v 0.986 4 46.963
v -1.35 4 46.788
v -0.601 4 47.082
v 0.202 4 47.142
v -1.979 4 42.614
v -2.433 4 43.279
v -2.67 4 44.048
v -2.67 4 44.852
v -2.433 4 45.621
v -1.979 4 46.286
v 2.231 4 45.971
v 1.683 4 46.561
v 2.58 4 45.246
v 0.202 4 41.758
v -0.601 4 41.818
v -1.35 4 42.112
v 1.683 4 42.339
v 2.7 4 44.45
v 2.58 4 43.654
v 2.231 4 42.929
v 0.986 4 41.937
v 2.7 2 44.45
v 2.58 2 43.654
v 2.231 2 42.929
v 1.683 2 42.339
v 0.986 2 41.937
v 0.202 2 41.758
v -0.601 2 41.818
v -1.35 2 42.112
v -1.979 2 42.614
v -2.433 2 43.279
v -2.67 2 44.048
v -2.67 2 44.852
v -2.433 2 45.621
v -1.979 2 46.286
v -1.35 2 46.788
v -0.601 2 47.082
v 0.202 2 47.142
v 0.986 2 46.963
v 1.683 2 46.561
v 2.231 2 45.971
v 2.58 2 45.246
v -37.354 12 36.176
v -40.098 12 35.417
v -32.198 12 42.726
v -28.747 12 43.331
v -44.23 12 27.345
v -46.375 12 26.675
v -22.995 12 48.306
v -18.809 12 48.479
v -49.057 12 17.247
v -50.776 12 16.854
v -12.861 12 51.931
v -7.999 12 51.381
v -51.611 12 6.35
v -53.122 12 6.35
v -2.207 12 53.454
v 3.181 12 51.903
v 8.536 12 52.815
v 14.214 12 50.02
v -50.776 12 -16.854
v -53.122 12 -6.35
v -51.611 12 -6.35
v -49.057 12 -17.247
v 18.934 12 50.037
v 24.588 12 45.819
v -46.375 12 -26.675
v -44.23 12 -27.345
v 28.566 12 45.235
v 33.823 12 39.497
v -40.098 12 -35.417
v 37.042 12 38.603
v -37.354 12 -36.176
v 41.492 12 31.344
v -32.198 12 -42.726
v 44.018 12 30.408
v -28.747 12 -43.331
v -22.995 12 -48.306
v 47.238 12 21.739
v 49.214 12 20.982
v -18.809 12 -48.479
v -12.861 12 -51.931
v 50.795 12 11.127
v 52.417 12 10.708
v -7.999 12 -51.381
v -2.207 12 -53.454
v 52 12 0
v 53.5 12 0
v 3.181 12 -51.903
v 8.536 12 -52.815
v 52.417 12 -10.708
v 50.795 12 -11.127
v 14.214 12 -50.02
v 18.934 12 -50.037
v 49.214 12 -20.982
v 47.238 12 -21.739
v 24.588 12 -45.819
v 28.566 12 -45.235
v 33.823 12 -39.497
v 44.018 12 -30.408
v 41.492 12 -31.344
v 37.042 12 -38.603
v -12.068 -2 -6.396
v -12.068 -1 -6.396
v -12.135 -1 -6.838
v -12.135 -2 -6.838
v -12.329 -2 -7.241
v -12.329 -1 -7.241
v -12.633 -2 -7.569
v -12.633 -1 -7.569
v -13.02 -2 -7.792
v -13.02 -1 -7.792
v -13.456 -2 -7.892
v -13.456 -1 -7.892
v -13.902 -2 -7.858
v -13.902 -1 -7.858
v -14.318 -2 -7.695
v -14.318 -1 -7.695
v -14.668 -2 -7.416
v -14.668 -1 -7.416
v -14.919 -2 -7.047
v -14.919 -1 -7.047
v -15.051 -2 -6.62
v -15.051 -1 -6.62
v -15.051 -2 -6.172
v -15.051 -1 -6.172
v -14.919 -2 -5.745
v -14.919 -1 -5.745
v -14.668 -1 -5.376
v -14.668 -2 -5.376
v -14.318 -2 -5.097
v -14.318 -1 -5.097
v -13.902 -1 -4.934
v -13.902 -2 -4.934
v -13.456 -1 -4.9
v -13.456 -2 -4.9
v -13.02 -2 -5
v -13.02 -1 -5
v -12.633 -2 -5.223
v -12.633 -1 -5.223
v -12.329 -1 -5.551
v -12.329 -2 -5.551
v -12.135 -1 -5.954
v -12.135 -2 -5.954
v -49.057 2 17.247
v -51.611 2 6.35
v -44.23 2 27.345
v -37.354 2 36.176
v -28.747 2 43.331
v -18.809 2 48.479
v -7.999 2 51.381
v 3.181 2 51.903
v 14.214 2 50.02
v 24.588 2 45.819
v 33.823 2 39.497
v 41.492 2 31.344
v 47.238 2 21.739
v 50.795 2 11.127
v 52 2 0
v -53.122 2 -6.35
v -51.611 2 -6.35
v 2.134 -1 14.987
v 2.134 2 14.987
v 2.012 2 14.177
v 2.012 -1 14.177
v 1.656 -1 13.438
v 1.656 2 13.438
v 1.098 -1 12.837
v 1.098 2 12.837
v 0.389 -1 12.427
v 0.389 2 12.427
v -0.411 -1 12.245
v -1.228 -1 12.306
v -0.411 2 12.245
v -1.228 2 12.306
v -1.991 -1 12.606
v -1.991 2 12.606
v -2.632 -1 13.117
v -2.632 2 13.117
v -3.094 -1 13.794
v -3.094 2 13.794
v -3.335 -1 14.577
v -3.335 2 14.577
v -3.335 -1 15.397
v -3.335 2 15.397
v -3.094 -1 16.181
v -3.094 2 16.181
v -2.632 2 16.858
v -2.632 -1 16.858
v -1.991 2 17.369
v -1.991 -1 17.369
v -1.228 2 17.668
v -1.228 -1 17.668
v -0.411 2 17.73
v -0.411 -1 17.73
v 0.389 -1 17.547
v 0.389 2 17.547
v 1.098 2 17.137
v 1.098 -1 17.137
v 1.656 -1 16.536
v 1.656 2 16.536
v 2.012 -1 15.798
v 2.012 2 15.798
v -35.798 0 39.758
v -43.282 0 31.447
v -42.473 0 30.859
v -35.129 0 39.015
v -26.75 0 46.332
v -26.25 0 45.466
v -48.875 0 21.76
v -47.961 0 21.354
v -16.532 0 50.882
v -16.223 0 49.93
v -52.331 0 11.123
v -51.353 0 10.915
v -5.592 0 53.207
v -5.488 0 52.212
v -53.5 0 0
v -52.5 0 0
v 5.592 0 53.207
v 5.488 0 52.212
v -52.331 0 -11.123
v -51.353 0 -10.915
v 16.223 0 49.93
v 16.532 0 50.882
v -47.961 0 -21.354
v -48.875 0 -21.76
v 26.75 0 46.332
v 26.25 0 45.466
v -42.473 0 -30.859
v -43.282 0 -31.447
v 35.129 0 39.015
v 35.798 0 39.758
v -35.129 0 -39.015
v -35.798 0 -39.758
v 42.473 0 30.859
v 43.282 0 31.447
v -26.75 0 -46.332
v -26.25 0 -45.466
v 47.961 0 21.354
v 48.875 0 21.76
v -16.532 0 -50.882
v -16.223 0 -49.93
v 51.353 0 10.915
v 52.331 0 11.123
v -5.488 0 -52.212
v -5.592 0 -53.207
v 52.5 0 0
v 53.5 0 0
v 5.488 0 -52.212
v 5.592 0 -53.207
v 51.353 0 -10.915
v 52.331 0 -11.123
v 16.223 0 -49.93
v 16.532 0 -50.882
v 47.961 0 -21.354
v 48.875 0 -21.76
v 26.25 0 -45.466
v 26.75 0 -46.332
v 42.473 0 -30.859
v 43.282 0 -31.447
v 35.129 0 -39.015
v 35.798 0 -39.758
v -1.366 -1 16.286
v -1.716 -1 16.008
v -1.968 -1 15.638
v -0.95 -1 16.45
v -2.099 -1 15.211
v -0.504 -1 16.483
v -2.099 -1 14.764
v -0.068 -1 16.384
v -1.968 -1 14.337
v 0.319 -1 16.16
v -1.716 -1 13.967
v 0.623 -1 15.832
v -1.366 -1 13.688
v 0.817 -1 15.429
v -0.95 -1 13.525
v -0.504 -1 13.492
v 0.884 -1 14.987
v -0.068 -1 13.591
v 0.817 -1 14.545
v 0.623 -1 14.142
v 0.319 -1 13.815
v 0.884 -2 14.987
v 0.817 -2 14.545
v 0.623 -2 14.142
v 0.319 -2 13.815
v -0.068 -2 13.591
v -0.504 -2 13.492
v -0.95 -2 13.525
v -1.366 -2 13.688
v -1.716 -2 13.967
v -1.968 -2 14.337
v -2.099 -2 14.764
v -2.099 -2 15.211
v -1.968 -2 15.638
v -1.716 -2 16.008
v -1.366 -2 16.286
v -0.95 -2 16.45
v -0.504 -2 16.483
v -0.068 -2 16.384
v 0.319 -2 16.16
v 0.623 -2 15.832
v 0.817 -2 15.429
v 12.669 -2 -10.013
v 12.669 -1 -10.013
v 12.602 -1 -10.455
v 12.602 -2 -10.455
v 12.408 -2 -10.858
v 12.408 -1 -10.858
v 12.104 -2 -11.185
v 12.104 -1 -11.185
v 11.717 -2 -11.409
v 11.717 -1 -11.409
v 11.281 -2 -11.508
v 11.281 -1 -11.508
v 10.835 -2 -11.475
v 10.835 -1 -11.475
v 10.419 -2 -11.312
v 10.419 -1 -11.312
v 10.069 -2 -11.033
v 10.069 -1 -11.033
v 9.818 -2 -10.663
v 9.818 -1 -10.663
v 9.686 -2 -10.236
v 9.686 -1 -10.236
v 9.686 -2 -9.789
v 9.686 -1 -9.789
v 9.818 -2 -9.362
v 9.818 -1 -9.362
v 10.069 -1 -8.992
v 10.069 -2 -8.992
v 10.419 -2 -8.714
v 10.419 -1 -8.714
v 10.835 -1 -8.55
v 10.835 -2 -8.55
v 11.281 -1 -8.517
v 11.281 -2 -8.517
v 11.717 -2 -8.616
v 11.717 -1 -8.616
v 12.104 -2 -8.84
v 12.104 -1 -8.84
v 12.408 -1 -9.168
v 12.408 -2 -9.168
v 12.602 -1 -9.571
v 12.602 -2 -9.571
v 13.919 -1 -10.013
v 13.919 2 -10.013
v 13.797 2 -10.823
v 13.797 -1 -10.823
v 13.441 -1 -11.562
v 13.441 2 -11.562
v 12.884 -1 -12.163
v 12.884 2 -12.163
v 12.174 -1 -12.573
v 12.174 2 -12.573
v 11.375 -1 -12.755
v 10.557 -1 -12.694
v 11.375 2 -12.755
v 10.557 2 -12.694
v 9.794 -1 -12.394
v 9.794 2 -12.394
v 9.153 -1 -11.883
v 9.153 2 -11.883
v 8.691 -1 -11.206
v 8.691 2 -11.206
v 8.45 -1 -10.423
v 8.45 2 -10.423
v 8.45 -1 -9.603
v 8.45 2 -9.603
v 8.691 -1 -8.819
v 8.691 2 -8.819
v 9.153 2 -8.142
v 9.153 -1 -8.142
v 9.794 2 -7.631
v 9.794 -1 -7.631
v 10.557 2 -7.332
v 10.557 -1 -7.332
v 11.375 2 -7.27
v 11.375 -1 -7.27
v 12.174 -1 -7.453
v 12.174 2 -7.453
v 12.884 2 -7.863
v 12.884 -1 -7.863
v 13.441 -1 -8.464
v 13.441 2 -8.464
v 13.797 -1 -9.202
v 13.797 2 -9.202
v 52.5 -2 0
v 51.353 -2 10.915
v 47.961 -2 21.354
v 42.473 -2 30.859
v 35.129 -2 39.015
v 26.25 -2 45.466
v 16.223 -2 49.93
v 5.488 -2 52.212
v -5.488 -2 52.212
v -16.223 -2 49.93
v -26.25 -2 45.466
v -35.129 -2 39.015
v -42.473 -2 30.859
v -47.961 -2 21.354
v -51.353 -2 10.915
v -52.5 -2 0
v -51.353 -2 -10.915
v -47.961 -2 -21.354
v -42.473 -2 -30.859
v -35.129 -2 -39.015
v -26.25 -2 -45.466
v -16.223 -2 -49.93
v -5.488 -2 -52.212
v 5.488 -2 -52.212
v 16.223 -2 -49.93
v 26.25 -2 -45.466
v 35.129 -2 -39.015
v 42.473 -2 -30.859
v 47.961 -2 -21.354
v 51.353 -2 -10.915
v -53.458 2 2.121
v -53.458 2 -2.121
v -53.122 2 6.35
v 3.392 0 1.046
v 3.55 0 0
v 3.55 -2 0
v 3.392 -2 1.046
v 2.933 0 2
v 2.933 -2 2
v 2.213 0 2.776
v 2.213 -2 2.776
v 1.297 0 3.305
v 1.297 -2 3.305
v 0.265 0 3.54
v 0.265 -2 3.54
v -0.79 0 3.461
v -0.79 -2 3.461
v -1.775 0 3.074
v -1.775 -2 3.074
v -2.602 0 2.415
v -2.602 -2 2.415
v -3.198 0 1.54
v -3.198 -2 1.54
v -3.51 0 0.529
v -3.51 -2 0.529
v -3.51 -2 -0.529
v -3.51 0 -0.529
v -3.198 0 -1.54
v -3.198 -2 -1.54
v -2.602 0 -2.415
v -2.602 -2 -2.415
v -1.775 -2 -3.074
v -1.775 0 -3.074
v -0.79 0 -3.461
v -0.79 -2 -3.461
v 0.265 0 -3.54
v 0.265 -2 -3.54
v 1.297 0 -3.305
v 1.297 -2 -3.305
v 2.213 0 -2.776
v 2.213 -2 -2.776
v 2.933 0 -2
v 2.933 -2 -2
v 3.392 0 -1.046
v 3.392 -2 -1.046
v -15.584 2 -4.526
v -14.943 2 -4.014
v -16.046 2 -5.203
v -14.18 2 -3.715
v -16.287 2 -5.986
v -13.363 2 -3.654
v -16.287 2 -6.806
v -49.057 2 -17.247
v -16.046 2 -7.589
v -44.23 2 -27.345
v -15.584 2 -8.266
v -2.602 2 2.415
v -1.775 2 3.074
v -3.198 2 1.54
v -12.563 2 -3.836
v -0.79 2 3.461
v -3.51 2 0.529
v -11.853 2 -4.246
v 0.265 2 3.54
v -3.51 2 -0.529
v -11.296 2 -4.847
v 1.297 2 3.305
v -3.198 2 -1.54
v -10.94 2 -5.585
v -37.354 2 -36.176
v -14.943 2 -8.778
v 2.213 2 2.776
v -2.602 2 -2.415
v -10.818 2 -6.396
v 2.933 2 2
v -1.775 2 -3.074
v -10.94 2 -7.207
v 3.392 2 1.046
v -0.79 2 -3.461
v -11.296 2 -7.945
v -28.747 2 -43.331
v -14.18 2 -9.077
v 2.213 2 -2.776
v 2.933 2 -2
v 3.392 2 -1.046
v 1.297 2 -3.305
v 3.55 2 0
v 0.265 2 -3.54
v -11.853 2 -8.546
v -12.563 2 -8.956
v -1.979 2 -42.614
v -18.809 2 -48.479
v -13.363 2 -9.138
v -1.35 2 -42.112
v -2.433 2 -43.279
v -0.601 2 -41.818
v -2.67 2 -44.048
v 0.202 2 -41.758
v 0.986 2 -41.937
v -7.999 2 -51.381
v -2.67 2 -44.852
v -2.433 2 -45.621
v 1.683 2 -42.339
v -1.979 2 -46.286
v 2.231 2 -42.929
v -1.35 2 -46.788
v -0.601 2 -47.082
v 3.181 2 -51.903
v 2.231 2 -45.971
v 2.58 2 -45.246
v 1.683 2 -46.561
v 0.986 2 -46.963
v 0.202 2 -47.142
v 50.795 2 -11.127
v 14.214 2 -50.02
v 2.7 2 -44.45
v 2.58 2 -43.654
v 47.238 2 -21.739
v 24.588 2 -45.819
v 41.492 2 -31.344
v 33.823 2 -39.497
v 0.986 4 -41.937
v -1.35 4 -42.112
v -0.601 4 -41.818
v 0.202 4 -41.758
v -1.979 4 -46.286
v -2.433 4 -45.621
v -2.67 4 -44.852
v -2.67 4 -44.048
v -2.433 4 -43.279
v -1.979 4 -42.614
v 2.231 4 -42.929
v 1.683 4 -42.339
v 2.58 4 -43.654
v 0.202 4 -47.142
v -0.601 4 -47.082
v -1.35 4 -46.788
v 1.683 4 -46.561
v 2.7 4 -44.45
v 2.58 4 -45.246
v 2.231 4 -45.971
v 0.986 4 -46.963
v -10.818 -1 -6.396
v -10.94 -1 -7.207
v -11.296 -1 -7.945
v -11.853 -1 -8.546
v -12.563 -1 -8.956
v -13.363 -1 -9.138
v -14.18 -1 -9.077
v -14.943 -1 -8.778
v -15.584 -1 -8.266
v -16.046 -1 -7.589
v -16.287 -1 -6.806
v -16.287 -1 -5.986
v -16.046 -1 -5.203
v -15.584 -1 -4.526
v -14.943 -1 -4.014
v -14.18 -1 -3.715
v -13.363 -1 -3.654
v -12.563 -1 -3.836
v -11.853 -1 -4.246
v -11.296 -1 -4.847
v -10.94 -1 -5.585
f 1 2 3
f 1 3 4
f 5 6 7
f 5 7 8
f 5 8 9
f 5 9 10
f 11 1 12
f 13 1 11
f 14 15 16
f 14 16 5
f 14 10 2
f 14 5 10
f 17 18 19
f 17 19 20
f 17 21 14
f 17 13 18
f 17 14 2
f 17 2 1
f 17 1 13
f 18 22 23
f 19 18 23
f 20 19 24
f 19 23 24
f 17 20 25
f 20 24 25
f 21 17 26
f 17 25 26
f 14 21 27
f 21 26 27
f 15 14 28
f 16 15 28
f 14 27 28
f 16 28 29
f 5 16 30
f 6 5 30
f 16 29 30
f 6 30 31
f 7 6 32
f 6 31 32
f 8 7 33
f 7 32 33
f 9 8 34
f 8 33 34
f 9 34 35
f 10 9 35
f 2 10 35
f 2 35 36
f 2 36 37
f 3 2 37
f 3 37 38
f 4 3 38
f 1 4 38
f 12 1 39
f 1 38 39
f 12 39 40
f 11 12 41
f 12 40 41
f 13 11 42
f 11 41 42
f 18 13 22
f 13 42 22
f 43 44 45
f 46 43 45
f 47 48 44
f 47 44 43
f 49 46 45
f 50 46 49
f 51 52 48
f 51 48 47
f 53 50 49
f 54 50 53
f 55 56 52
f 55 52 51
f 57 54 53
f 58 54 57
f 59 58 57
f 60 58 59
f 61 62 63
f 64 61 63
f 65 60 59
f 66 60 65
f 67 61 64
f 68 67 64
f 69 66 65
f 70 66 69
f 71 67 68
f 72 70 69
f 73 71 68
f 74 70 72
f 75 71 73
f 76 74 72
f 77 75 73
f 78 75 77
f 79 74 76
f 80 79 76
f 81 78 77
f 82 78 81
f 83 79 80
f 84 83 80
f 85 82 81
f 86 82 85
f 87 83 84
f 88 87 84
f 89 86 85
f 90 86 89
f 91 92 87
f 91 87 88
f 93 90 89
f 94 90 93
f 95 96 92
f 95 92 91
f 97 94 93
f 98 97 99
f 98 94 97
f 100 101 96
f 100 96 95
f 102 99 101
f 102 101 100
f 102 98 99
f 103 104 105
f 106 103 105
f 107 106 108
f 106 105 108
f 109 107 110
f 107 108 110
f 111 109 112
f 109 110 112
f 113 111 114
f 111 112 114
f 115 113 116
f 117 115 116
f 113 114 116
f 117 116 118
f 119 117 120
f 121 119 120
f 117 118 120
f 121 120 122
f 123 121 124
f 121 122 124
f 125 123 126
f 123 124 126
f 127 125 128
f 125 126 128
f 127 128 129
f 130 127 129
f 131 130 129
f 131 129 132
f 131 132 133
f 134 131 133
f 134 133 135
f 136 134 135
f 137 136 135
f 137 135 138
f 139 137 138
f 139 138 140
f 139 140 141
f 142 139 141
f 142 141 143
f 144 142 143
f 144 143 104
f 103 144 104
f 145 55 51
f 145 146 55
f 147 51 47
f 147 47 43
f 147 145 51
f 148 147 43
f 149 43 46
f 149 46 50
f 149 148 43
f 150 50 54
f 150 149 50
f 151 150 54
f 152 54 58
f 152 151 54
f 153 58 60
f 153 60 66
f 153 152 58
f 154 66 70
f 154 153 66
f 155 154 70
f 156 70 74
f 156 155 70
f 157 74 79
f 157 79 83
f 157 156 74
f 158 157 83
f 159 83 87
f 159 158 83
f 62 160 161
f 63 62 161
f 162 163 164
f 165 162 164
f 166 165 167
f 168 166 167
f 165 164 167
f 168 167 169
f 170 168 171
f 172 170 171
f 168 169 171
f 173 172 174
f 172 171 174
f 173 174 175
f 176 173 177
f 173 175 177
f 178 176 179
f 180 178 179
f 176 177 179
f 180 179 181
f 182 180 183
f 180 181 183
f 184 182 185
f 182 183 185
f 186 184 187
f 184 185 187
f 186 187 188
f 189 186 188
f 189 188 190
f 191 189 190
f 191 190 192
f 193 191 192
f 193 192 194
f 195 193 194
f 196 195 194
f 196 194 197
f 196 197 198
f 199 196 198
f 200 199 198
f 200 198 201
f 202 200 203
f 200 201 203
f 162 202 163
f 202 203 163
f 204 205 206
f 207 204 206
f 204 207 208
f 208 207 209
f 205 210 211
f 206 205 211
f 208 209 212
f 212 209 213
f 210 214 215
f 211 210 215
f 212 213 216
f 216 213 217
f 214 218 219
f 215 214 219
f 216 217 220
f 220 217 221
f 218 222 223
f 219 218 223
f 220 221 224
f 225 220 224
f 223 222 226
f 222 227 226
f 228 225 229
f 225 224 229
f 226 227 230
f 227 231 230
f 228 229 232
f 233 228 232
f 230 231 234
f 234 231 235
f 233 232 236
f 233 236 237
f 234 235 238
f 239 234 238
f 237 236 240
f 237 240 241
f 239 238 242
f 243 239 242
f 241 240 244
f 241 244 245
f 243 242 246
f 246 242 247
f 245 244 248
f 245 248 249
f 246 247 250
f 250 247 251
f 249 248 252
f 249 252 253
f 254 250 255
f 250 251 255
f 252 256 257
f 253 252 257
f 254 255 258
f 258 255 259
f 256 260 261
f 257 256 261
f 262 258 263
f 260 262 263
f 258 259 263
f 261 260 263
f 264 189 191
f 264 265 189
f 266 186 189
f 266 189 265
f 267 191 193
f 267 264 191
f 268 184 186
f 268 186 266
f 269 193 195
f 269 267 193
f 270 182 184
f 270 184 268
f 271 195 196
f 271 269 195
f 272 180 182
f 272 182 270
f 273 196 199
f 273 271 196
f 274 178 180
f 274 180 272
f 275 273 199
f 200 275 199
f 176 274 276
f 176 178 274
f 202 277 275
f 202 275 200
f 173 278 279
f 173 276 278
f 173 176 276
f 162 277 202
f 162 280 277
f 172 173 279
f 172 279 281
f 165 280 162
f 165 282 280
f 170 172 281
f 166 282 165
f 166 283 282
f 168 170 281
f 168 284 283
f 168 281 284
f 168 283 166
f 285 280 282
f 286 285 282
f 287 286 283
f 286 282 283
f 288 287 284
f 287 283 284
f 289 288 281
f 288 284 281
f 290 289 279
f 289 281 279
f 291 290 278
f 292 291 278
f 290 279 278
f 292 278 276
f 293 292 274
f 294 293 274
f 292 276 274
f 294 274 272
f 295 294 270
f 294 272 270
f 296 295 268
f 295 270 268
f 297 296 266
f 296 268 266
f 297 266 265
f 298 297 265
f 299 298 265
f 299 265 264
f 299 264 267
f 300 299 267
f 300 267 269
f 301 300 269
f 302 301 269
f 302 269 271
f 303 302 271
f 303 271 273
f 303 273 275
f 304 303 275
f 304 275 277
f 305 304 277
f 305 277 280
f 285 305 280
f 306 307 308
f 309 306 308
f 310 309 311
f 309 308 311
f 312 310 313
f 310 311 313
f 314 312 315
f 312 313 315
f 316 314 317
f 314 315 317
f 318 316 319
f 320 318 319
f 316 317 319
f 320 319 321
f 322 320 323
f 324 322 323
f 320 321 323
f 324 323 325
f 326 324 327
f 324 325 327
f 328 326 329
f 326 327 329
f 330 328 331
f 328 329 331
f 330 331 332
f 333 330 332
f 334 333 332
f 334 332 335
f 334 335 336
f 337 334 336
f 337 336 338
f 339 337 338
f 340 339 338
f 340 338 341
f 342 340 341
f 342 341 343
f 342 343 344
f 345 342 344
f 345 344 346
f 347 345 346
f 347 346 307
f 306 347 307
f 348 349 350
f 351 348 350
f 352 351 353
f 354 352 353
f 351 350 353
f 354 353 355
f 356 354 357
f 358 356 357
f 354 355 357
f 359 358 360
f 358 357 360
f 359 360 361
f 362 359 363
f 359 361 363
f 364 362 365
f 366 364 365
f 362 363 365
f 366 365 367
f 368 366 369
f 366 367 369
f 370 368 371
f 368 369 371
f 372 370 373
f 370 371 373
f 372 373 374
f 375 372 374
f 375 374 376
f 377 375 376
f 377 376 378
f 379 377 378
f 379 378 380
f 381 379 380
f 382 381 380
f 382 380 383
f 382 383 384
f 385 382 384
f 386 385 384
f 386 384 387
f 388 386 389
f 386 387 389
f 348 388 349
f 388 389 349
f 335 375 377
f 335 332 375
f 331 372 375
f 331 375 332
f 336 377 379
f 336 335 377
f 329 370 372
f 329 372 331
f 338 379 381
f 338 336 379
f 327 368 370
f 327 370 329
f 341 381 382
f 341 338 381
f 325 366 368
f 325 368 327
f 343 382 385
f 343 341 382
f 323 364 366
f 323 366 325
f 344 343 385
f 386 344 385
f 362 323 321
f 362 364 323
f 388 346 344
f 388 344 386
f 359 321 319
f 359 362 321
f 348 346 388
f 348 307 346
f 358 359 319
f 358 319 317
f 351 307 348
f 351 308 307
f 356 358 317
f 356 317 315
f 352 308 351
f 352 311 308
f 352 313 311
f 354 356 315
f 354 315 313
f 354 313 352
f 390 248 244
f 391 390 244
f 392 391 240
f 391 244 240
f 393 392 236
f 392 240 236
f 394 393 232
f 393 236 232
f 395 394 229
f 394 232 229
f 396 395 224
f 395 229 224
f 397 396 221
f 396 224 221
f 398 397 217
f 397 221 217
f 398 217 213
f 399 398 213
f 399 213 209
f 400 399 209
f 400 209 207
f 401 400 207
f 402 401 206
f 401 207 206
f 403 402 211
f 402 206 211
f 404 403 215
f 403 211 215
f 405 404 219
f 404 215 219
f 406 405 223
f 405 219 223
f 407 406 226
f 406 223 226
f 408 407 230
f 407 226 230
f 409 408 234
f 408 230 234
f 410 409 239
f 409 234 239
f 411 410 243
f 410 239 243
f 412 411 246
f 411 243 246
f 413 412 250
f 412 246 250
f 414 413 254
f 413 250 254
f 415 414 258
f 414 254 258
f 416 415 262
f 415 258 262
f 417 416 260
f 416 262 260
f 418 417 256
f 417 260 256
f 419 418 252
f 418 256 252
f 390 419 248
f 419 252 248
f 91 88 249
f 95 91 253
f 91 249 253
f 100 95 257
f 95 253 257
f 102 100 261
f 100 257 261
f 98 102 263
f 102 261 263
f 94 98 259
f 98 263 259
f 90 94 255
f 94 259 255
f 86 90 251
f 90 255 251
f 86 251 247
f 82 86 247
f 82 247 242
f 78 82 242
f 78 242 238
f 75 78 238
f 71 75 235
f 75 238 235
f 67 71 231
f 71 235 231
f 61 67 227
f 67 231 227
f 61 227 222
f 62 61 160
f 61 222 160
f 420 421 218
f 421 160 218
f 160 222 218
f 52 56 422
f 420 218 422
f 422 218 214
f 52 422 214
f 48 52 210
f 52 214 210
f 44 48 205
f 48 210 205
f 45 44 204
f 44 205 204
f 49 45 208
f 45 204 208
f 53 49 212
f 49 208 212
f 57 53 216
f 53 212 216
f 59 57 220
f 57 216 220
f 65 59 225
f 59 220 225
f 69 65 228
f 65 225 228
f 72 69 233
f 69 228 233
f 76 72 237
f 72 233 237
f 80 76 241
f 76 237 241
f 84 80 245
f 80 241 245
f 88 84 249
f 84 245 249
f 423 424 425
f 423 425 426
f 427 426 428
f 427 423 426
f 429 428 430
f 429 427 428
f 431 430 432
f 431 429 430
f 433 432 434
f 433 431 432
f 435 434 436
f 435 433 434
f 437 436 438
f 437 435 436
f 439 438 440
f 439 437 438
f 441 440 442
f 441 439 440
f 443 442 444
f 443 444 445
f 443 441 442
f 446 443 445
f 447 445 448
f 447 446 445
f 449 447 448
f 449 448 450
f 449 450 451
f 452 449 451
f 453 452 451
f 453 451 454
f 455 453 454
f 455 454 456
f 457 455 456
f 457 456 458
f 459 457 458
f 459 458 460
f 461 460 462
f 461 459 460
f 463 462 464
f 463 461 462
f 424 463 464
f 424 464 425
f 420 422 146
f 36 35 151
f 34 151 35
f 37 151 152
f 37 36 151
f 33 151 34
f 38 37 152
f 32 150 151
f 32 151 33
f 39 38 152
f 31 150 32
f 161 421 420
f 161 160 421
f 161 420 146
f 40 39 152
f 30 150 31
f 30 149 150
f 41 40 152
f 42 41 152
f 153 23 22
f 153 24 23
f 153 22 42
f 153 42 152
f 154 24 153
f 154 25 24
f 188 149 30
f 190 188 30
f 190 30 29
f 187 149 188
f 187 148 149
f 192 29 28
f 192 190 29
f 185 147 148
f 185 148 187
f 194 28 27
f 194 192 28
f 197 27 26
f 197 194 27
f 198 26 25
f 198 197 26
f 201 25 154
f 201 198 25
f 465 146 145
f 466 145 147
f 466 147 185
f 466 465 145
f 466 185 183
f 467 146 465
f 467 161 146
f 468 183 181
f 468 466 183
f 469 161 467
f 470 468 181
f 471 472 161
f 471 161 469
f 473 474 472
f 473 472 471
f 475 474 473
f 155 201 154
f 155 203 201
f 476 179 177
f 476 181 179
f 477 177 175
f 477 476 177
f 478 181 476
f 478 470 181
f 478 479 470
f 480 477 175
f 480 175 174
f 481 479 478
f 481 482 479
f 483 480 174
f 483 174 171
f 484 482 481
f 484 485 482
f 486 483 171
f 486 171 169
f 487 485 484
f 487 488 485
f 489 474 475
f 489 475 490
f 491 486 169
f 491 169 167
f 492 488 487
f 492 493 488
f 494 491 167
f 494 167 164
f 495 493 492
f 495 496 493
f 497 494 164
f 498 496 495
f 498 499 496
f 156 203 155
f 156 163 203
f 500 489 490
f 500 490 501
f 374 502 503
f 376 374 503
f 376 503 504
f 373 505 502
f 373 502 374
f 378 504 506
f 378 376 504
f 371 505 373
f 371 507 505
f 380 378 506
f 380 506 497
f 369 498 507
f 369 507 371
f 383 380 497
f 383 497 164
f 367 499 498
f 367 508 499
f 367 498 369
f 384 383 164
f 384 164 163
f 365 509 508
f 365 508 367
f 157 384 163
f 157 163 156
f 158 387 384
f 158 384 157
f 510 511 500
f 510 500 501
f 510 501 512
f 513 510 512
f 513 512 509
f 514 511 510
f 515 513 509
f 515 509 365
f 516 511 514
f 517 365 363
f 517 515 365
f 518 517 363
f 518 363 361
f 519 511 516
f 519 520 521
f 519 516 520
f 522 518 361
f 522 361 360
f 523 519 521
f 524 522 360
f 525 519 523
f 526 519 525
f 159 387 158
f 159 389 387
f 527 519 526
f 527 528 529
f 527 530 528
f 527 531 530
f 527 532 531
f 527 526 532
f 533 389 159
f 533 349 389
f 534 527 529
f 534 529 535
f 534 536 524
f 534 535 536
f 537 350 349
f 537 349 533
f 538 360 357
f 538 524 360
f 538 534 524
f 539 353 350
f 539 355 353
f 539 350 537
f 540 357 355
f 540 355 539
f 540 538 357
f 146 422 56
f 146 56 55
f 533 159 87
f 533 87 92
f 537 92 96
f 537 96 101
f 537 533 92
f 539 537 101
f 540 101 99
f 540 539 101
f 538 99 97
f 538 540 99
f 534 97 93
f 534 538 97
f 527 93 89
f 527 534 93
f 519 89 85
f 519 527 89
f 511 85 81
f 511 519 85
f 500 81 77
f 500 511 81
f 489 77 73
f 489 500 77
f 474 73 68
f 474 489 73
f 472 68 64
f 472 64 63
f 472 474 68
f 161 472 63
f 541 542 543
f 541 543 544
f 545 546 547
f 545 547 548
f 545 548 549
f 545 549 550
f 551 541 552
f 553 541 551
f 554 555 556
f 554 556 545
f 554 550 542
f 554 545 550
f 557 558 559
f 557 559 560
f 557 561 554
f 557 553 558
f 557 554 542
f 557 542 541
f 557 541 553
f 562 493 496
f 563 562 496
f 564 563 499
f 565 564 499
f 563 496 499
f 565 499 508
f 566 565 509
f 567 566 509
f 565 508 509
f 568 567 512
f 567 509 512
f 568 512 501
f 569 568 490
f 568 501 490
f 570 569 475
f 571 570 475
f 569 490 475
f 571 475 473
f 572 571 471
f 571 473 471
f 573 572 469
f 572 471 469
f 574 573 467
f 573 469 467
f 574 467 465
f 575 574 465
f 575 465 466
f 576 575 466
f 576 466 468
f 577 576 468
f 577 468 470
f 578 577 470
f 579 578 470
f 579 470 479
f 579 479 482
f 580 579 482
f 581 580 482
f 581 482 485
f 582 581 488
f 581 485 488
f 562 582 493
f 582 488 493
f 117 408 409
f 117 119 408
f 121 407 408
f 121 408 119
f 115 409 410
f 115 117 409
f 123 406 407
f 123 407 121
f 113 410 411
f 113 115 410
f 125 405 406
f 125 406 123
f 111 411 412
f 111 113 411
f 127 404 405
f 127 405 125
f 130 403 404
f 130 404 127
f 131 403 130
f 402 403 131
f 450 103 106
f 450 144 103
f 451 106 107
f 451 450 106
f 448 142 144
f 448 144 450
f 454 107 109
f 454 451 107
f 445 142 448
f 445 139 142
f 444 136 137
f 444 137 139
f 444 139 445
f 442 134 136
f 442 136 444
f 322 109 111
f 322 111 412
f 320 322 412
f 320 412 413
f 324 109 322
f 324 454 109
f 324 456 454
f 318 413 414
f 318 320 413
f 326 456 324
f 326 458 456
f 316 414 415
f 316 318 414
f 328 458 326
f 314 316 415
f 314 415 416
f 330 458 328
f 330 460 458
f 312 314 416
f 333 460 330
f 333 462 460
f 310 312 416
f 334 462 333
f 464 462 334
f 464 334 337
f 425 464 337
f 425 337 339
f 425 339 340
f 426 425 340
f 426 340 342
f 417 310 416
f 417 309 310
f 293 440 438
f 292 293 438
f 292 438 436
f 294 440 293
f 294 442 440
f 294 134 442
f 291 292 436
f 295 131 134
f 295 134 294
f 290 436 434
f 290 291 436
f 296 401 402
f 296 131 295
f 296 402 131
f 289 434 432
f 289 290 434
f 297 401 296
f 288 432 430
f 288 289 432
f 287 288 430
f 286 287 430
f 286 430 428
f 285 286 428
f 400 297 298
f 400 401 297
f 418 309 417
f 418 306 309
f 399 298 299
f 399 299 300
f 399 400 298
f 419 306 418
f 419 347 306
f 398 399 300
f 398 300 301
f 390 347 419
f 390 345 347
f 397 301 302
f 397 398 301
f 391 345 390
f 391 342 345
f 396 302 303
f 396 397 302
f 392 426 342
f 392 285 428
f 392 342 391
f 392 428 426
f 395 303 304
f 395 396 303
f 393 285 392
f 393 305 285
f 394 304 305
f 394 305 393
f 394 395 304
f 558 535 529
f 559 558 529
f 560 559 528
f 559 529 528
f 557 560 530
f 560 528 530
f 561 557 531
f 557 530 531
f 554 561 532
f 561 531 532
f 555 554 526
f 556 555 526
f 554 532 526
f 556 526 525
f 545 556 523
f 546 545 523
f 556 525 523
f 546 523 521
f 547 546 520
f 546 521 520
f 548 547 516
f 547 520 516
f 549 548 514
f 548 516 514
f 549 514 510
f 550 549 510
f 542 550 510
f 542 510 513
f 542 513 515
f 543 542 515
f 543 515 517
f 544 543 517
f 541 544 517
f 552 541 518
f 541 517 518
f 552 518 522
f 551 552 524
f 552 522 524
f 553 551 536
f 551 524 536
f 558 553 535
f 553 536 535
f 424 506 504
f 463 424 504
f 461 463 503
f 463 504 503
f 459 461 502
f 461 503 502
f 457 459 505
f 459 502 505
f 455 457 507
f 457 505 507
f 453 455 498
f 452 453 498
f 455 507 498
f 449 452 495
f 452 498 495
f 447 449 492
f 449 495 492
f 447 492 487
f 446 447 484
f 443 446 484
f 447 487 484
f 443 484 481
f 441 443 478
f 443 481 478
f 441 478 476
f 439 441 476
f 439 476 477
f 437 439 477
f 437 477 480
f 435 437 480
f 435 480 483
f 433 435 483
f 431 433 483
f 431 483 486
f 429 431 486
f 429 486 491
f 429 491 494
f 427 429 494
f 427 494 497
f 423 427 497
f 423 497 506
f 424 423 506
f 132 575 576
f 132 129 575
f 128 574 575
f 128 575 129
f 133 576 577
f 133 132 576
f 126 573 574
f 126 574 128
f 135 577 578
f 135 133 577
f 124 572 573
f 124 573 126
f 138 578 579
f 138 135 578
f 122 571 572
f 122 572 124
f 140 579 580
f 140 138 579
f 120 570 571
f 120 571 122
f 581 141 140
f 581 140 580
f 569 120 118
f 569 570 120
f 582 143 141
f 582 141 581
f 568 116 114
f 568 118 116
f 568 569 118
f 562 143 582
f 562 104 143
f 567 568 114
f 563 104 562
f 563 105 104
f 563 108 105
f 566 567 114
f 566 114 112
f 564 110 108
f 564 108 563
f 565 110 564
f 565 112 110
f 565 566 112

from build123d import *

# Parameters (mm, degrees)
SKETCH1_R           = 53.5
BOSS_EXTRUDE1_DEPTH = 2
SKETCH2_R           = 2.7
BOSS_EXTRUDE2_DEPTH = 2
SKETCH3_R           = 3.55
CUT_EXTRUDE1_DEPTH  = 2
SKETCH7_R           = 53.5
SKETCH7_R_2         = 52
BOSS_EXTRUDE3_DEPTH = 10
SKETCH8_W           = 56.651812746
SKETCH8_H           = 12.7
CUT_EXTRUDE4_DEPTH  = 10
SKETCH13_R          = 52.5
SKETCH13_R_2        = 3.55
BOSS_EXTRUDE4_DEPTH = 2
SKETCH12_R          = 2.75
CUT_EXTRUDE6_DEPTH  = 3
SKETCH16_R          = 1.5
CUT_EXTRUDE8_DEPTH  = 2


with BuildPart() as part:
    # Sketch1 → Boss-Extrude1 (new body)
    with BuildSketch(Plane(origin=(0, 0, 0), x_dir=(1, 0, 0), z_dir=(0, 1, 0))):
        Circle(SKETCH1_R)
    extrude(amount=BOSS_EXTRUDE1_DEPTH)

    # Sketch2 → Boss-Extrude2 (add)
    with BuildSketch(Plane(origin=(0, 2, 0), x_dir=(1, 0, 0), z_dir=(0, 1, 0))):
        with Locations((0, -44.45)):
            Circle(SKETCH2_R)
        with Locations((0, 44.45)):
            Circle(SKETCH2_R)
    extrude(amount=BOSS_EXTRUDE2_DEPTH)

    # Sketch3 → Cut-Extrude1 (cut)
    with BuildSketch(Plane(origin=(0, 2, 0), x_dir=(1, 0, 0), z_dir=(0, 1, 0))):
        Circle(SKETCH3_R)
    extrude(amount=-CUT_EXTRUDE1_DEPTH, mode=Mode.SUBTRACT)

    # Sketch7 → Boss-Extrude3 (add)
    with BuildSketch(Plane(origin=(0, 2, 0), x_dir=(1, 0, 0), z_dir=(0, 1, 0))):
        Circle(SKETCH7_R)
        Circle(SKETCH7_R_2, mode=Mode.SUBTRACT)
    extrude(amount=BOSS_EXTRUDE3_DEPTH)

    # Sketch8 → Cut-Extrude4 (cut)
    with BuildSketch(Plane(origin=(0, 2, 0), x_dir=(1, 0, 0), z_dir=(0, 1, 0))):
        with Locations((-28.325906373, 0)):
            Rectangle(SKETCH8_W, SKETCH8_H)
    extrude(amount=CUT_EXTRUDE4_DEPTH, mode=Mode.SUBTRACT)

    # Sketch13 → Boss-Extrude4 (add)
    with BuildSketch(Plane.XZ):
        Circle(SKETCH13_R)
        Circle(SKETCH13_R_2, mode=Mode.SUBTRACT)
    extrude(amount=BOSS_EXTRUDE4_DEPTH)

    # Sketch12 → Cut-Extrude6 (cut)
    with BuildSketch(Plane(origin=(0, 2, 0), x_dir=(1, 0, 0), z_dir=(0, 1, 0))):
        with Locations((11.16900504, 10.012658309)):
            Circle(SKETCH12_R)
        with Locations((-0.61610798, -14.987341691)):
            Circle(SKETCH12_R)
        with Locations((-13.568010506, 6.396021491)):
            Circle(SKETCH12_R)
    extrude(amount=-CUT_EXTRUDE6_DEPTH, mode=Mode.SUBTRACT)

    # Sketch16 → Cut-Extrude8 (cut, through all)
    with BuildSketch(Plane(origin=(0, -1, 0), x_dir=(1, 0, 0), z_dir=(0, 1, 0))):
        with Locations((11.16900504, 10.012658309)):
            Circle(SKETCH16_R)
        with Locations((-0.61610798, -14.987341691)):
            Circle(SKETCH16_R)
        with Locations((-13.568010506, 6.396021491)):
            Circle(SKETCH16_R)
    extrude(amount=-CUT_EXTRUDE8_DEPTH, mode=Mode.SUBTRACT)


solid = part.part
